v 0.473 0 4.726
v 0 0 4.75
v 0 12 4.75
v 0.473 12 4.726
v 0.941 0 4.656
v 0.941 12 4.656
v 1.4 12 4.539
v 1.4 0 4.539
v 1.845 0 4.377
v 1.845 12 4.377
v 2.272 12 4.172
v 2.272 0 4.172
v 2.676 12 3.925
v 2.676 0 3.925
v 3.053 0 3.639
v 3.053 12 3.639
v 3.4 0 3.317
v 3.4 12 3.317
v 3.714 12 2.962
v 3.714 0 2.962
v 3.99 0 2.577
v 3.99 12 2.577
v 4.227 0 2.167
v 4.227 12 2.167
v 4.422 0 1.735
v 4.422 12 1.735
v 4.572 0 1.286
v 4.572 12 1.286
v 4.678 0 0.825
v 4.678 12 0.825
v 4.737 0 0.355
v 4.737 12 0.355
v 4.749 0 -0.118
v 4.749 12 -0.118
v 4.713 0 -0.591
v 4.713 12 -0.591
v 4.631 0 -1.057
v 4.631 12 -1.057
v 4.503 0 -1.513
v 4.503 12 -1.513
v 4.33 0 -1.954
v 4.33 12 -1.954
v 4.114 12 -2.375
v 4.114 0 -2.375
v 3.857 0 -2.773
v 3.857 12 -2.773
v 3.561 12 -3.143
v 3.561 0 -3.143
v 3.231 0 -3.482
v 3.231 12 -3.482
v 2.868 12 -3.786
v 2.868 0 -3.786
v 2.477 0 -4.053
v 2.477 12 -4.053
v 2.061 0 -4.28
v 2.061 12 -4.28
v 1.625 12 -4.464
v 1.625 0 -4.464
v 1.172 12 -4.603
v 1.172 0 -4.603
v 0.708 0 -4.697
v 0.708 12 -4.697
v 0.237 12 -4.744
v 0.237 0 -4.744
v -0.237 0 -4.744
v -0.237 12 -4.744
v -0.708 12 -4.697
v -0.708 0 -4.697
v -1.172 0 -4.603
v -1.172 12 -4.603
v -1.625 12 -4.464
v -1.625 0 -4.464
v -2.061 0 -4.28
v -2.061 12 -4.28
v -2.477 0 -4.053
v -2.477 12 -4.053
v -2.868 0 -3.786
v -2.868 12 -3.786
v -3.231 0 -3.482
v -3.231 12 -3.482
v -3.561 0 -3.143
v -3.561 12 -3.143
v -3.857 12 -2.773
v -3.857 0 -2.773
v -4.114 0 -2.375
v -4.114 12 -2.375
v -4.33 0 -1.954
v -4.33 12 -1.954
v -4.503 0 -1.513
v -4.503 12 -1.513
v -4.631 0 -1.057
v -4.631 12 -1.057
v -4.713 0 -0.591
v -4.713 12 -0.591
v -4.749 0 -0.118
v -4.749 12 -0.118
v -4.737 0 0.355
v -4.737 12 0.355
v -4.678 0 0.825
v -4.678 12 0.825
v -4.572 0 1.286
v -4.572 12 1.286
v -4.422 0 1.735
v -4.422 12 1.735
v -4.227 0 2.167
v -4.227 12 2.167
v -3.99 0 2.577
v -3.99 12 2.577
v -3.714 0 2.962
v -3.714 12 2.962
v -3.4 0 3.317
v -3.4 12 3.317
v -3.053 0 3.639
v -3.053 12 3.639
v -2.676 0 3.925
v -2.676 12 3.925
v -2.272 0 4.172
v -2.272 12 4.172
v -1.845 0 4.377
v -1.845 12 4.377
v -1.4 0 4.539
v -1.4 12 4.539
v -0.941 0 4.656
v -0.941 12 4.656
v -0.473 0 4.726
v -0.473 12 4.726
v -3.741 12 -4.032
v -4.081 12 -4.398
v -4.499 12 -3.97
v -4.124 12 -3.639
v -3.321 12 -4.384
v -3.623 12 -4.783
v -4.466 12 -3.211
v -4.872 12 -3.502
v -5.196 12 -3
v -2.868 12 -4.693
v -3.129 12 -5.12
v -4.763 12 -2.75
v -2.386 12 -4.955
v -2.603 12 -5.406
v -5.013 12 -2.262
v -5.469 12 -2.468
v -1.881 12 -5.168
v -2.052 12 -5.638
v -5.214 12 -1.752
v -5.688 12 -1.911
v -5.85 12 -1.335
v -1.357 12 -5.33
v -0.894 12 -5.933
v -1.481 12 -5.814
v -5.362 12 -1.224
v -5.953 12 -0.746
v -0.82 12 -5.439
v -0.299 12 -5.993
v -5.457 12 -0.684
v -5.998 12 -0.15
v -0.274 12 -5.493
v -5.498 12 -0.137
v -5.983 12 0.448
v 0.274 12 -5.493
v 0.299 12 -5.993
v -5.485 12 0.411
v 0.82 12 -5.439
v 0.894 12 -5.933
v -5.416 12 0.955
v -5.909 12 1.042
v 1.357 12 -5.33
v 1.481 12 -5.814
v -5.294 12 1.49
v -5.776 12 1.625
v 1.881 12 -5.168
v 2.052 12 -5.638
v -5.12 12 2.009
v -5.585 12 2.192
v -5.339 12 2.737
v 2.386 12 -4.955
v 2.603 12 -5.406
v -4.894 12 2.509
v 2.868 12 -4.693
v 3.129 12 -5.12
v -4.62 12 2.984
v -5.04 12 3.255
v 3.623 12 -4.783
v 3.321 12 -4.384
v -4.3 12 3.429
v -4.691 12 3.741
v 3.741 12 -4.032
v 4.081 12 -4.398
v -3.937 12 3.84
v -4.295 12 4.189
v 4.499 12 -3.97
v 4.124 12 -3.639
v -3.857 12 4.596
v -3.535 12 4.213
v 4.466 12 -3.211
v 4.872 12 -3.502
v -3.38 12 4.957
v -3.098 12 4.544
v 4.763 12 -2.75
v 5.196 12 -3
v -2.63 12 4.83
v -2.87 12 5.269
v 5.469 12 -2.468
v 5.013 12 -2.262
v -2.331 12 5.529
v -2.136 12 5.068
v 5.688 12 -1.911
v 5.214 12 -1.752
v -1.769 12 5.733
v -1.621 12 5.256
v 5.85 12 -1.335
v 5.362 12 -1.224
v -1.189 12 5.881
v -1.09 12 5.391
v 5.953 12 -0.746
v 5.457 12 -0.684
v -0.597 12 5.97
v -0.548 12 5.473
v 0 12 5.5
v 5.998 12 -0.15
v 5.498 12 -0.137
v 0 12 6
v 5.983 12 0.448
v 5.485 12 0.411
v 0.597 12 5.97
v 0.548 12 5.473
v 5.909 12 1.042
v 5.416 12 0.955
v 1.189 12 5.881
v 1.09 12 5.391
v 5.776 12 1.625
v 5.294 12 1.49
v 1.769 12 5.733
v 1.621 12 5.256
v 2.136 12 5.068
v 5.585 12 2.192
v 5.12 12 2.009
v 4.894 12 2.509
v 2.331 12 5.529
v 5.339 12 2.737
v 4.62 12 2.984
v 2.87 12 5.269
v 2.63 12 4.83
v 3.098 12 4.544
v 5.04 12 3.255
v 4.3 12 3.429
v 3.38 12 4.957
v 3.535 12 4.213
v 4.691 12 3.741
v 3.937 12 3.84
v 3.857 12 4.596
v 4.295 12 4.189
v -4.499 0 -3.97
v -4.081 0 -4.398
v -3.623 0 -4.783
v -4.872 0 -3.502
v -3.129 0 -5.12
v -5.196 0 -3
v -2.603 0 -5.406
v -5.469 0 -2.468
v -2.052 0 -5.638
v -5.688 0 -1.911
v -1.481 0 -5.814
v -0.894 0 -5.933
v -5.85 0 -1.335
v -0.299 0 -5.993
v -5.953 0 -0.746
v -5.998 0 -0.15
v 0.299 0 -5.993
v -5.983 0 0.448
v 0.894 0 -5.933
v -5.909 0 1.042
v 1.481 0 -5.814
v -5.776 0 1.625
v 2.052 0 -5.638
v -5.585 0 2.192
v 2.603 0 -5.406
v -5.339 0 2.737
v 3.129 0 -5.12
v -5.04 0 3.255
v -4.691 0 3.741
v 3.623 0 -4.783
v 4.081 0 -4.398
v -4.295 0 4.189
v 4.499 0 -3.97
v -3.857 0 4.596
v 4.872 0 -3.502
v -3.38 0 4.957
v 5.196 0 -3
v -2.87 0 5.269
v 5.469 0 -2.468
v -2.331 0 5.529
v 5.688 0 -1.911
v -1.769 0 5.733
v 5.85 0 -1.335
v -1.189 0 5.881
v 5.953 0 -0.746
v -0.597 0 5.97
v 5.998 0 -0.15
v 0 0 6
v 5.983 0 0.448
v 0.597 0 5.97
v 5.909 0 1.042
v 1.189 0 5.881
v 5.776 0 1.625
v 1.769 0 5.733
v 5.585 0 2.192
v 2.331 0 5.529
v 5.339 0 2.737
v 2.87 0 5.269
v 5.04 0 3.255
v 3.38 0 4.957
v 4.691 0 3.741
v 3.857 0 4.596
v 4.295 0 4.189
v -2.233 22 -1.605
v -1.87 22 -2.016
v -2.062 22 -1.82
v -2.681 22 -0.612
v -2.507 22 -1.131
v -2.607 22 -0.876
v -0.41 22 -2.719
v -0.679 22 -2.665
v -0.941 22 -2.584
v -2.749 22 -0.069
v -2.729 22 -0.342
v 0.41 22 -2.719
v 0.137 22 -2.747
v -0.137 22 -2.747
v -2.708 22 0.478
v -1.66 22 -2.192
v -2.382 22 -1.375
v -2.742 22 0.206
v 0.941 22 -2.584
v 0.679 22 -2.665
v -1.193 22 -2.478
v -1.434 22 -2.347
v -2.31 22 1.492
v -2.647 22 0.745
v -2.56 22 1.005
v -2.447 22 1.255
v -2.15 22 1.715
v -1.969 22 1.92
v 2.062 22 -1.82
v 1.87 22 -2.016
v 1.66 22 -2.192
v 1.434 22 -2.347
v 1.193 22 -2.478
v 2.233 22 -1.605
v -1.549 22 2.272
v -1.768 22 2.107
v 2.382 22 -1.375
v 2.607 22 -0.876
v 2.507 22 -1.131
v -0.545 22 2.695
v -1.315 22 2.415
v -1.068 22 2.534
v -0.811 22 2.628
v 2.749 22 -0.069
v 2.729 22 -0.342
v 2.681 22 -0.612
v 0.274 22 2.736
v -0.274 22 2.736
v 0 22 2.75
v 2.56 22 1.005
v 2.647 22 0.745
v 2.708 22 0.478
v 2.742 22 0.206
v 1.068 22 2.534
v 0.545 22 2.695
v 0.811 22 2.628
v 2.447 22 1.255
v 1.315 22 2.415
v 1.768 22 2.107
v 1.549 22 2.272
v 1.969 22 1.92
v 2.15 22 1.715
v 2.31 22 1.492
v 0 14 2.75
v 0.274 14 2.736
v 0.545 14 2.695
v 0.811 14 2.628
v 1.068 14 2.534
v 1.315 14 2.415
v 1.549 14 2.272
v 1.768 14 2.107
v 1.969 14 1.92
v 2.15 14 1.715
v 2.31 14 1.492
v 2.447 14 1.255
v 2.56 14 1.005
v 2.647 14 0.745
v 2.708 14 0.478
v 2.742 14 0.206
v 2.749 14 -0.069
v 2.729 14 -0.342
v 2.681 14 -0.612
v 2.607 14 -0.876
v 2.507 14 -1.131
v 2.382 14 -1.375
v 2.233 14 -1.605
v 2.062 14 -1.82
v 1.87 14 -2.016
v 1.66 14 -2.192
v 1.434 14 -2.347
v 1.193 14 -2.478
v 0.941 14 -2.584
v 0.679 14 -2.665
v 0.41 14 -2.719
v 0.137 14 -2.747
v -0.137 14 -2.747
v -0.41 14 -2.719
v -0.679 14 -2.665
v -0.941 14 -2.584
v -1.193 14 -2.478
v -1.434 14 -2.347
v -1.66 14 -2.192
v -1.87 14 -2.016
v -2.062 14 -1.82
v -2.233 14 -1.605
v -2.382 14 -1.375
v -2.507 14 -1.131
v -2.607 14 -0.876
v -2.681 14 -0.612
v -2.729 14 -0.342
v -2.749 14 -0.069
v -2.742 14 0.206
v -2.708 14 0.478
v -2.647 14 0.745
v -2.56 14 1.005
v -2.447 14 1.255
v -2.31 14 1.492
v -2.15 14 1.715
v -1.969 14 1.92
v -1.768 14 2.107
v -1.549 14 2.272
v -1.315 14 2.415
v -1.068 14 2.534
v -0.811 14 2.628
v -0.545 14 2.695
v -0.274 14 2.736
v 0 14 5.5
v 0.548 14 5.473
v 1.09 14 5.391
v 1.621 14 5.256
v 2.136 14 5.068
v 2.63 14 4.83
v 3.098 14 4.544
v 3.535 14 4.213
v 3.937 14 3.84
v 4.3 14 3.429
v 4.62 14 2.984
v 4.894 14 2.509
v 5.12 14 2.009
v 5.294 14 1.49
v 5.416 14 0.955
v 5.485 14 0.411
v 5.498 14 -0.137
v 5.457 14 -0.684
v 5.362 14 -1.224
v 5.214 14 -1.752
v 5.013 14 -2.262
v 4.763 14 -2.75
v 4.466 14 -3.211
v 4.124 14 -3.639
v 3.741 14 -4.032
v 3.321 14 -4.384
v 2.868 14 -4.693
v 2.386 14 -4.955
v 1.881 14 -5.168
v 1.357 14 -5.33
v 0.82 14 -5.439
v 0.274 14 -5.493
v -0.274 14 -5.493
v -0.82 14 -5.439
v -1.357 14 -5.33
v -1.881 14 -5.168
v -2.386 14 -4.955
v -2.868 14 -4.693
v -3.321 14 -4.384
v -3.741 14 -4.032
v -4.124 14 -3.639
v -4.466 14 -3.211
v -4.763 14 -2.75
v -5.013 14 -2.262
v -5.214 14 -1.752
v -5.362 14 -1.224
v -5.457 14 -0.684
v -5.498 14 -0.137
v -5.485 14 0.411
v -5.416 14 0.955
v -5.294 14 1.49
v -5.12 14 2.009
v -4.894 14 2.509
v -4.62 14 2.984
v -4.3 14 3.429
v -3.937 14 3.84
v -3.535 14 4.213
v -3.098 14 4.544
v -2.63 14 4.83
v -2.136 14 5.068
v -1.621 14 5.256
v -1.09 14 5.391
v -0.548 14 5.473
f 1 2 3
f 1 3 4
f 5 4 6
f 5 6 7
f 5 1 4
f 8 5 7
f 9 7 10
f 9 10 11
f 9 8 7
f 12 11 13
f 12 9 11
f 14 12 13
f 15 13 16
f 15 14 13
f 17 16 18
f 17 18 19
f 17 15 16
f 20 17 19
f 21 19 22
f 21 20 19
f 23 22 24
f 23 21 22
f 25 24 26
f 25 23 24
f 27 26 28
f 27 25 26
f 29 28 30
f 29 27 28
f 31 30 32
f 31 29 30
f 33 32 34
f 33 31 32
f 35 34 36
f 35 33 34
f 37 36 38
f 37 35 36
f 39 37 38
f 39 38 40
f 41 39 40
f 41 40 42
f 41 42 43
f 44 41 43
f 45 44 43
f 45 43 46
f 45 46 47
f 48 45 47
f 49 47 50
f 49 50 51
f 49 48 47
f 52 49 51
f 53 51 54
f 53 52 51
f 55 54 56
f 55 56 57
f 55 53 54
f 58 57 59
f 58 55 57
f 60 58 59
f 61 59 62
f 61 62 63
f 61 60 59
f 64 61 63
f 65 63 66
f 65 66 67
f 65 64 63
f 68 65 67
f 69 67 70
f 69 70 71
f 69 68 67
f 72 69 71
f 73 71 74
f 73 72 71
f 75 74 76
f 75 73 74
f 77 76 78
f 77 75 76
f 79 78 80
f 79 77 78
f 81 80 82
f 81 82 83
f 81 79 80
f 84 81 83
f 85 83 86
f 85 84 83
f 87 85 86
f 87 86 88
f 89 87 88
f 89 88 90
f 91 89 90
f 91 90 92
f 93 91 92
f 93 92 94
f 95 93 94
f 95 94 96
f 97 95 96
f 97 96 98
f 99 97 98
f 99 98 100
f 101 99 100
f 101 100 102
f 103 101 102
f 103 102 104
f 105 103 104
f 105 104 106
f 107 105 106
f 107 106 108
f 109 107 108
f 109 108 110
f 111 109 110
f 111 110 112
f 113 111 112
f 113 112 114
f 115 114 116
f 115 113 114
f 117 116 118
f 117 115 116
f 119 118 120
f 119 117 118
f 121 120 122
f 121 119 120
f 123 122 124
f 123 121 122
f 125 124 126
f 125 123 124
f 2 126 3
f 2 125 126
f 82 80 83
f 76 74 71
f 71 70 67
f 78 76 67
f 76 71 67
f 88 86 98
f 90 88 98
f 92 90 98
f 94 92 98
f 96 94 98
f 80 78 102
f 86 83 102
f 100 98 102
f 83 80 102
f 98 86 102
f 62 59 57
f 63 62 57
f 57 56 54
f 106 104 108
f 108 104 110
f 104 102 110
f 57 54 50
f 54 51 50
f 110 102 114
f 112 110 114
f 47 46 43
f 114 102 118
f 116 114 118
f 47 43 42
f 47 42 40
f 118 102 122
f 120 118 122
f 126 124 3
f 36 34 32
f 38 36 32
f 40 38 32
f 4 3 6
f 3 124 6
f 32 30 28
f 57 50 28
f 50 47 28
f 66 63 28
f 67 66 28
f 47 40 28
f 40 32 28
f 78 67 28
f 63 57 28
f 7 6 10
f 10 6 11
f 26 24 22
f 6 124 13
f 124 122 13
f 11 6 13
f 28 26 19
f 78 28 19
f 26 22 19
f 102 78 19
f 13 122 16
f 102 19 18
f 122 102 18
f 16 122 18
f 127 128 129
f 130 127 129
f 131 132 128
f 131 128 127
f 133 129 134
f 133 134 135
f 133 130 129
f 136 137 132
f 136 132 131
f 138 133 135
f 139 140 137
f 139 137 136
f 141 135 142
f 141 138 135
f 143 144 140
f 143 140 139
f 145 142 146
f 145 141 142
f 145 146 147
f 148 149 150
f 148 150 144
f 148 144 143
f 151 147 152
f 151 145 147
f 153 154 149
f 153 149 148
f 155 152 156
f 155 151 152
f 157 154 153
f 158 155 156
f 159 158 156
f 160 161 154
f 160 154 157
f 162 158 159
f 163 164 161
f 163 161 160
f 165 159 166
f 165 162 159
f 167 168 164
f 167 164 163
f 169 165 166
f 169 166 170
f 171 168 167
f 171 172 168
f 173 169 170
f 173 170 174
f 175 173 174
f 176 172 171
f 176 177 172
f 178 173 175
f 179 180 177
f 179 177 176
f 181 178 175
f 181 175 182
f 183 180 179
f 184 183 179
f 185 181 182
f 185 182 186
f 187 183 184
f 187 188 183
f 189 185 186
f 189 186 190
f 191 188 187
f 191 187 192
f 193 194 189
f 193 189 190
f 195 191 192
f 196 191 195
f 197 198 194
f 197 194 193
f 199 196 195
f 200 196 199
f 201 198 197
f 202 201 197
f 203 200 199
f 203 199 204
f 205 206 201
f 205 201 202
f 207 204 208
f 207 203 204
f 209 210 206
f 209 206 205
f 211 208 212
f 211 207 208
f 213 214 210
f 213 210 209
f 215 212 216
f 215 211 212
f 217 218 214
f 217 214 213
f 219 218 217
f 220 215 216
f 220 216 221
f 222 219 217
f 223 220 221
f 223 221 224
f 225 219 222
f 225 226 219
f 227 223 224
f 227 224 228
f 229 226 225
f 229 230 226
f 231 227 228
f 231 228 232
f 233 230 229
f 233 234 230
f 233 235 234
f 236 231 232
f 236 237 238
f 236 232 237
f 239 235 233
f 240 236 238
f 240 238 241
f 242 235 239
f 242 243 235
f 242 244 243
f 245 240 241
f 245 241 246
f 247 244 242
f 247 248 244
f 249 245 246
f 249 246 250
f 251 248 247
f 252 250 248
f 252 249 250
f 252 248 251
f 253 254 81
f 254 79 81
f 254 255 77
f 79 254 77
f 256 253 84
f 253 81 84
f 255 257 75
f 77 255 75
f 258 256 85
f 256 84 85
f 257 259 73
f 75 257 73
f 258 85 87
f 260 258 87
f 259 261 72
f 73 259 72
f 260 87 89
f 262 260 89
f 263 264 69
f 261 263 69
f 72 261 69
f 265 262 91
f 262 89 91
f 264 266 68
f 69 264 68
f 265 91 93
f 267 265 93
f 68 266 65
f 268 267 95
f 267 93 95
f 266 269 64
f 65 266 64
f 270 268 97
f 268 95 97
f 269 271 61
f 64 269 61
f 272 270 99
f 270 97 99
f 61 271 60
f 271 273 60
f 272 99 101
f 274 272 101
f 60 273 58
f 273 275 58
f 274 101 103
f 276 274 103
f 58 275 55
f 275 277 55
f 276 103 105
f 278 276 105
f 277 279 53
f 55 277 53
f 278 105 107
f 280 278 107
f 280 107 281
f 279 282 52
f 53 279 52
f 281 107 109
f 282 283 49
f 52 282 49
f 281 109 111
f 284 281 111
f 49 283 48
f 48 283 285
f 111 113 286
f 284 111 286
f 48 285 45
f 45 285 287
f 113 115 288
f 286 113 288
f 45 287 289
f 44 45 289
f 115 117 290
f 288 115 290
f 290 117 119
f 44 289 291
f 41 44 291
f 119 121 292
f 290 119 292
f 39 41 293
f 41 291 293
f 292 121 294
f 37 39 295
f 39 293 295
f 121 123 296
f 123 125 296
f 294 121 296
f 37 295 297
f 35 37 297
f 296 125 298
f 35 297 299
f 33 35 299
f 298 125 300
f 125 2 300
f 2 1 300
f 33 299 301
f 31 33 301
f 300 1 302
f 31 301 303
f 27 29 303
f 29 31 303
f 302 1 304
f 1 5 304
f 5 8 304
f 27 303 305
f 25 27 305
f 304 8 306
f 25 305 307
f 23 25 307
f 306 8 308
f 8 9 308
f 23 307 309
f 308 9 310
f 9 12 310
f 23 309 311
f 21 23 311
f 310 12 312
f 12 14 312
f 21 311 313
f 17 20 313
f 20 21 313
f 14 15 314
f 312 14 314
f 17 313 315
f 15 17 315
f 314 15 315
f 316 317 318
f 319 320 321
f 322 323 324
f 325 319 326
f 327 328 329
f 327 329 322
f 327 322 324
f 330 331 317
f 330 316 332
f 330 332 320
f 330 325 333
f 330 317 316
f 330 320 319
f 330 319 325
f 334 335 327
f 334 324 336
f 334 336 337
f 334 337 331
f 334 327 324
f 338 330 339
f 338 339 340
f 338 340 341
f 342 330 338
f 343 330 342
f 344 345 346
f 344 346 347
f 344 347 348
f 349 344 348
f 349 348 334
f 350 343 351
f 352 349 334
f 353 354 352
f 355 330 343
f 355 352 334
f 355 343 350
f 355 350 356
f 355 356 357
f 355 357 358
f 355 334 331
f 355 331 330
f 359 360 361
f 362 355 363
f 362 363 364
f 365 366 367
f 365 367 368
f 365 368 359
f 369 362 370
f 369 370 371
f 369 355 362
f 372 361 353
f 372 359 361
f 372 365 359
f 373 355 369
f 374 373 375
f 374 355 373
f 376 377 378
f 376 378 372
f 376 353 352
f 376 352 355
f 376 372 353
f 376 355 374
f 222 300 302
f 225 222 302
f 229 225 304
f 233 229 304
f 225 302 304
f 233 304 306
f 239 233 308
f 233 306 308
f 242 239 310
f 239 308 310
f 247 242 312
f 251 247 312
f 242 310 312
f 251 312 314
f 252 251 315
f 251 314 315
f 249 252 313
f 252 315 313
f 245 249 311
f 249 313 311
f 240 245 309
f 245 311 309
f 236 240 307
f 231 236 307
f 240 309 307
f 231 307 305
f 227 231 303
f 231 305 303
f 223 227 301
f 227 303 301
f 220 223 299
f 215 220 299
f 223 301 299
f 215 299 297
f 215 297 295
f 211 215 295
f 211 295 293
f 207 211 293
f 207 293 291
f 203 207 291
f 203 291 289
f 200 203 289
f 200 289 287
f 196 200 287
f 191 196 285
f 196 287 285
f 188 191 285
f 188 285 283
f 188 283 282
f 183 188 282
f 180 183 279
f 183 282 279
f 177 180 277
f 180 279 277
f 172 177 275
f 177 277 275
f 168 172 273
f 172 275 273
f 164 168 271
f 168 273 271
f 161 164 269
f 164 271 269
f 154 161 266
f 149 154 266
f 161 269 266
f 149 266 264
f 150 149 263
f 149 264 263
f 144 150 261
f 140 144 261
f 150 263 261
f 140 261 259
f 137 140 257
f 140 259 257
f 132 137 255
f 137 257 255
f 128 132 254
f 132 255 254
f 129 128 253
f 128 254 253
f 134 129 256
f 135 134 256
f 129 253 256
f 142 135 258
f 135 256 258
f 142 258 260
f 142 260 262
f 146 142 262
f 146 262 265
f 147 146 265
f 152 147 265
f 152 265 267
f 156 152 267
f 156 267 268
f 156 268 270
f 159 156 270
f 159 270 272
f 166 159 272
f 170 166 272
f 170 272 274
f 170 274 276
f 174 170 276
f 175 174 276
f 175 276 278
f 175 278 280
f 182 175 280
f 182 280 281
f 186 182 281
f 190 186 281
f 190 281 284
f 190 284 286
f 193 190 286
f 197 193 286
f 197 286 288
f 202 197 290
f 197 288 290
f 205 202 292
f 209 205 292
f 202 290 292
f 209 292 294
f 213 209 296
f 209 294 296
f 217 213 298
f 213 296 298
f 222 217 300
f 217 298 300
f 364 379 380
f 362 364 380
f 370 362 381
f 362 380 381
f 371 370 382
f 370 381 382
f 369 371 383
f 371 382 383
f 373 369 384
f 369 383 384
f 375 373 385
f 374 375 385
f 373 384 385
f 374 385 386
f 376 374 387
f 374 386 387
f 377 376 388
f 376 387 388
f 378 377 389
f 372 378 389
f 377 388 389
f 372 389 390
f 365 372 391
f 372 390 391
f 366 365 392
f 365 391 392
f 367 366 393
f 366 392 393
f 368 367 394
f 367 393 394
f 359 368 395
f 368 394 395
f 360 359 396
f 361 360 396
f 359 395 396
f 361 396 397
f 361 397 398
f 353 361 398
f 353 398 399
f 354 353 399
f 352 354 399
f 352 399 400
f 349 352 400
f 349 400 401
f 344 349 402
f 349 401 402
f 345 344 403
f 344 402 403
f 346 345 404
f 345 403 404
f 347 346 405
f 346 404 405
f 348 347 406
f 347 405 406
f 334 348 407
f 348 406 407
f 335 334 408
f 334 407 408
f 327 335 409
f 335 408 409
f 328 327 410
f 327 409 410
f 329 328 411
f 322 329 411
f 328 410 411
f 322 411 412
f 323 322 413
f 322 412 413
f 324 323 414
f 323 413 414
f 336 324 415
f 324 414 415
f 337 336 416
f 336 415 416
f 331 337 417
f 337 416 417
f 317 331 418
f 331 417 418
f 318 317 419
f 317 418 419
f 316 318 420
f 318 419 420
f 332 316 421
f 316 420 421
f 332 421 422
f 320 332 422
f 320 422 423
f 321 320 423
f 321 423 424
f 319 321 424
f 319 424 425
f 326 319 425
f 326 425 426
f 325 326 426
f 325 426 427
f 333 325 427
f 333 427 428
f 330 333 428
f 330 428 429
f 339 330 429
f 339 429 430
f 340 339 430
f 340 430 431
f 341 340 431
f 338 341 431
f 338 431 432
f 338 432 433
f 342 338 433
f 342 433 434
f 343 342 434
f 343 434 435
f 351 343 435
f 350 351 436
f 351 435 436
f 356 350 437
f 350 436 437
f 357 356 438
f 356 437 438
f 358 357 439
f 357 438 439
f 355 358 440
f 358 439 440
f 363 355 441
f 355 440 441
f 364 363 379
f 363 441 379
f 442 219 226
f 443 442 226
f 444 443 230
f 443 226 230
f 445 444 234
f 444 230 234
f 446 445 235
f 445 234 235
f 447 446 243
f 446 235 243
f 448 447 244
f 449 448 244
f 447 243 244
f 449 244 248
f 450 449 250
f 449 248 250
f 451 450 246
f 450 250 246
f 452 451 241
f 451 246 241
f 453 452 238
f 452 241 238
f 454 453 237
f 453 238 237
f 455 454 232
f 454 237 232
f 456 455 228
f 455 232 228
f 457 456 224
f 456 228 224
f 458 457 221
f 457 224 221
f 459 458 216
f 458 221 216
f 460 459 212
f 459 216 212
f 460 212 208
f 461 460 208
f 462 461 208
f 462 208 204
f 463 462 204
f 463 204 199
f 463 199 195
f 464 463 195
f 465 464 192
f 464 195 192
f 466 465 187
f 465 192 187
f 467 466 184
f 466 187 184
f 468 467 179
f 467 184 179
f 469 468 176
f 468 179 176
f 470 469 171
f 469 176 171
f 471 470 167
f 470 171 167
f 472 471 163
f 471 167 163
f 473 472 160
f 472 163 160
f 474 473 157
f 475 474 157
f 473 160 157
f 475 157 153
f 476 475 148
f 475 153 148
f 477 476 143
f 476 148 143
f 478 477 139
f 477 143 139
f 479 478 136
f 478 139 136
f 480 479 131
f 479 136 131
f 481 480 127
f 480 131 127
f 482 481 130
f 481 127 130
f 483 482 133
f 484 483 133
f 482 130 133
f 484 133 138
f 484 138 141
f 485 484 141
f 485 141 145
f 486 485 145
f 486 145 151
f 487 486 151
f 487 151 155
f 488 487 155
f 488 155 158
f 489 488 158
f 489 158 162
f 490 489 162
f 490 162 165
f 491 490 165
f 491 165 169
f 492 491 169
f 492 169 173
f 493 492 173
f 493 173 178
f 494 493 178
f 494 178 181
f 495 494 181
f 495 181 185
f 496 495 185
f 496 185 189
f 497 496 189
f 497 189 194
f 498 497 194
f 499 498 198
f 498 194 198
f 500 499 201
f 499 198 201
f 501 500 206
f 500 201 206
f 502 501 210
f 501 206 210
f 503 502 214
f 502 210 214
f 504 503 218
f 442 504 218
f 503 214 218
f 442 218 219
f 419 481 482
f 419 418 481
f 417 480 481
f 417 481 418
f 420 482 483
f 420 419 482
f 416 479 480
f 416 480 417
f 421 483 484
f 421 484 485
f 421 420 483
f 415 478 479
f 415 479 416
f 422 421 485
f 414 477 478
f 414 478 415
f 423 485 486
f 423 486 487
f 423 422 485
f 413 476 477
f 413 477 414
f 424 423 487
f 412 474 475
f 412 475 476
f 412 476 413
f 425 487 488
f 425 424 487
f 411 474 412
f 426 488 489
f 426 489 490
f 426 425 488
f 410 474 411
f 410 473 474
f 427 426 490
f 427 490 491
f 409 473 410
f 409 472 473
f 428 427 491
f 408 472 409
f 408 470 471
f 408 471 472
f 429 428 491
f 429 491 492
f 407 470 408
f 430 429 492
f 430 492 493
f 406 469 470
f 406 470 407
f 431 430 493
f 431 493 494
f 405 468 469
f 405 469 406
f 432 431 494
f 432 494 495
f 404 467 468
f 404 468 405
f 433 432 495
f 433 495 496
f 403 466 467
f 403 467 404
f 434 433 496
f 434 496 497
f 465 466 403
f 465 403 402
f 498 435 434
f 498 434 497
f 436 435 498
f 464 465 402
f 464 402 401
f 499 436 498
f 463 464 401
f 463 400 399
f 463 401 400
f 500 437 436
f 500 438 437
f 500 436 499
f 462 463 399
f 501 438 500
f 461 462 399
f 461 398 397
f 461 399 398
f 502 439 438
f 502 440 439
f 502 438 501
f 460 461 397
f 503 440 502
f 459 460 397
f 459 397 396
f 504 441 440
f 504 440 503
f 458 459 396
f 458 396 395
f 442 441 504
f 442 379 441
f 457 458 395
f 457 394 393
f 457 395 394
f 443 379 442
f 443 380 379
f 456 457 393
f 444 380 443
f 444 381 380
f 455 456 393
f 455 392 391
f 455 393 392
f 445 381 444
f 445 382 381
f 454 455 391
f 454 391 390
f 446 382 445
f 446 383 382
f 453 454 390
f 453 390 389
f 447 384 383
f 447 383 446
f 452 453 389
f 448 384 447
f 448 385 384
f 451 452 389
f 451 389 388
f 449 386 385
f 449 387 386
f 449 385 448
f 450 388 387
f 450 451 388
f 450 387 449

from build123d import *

# Parameters (mm, degrees)
SKETCH_1_R      = 6
SKETCH_1_R_2    = 4.75
EXTRUDE_1_DEPTH = 12
SKETCH_2_R      = 5.5
EXTRUDE_2_DEPTH = 2
SKETCH_3_R      = 2.75
EXTRUDE_3_DEPTH = 8


with BuildPart() as part:
    # 草图1 → 凸台-拉伸1 (new body)
    with BuildSketch(Plane(origin=(0, 0, 0), x_dir=(1, 0, 0), z_dir=(0, 1, 0))):
        with Locations(Location((0, 0, 0), (0, 0, 270))):
            Circle(SKETCH_1_R)
        with Locations(Location((0, 0, 0), (0, 0, 270))):
            Circle(SKETCH_1_R_2, mode=Mode.SUBTRACT)
    extrude(amount=EXTRUDE_1_DEPTH)

    # 草图2 → 凸台-拉伸2 (add)
    with BuildSketch(Plane(origin=(0, 12, 0), x_dir=(1, 0, 0), z_dir=(0, 1, 0))):
        with Locations(Location((0, 0, 0), (0, 0, 270))):
            Circle(SKETCH_2_R)
    extrude(amount=EXTRUDE_2_DEPTH)

    # 草图3 → 凸台-拉伸3 (add)
    with BuildSketch(Plane(origin=(0, 14, 0), x_dir=(1, 0, 0), z_dir=(0, 1, 0))):
        with Locations(Location((0, 0, 0), (0, 0, 270))):
            Circle(SKETCH_3_R)
    extrude(amount=EXTRUDE_3_DEPTH)


solid = part.part
